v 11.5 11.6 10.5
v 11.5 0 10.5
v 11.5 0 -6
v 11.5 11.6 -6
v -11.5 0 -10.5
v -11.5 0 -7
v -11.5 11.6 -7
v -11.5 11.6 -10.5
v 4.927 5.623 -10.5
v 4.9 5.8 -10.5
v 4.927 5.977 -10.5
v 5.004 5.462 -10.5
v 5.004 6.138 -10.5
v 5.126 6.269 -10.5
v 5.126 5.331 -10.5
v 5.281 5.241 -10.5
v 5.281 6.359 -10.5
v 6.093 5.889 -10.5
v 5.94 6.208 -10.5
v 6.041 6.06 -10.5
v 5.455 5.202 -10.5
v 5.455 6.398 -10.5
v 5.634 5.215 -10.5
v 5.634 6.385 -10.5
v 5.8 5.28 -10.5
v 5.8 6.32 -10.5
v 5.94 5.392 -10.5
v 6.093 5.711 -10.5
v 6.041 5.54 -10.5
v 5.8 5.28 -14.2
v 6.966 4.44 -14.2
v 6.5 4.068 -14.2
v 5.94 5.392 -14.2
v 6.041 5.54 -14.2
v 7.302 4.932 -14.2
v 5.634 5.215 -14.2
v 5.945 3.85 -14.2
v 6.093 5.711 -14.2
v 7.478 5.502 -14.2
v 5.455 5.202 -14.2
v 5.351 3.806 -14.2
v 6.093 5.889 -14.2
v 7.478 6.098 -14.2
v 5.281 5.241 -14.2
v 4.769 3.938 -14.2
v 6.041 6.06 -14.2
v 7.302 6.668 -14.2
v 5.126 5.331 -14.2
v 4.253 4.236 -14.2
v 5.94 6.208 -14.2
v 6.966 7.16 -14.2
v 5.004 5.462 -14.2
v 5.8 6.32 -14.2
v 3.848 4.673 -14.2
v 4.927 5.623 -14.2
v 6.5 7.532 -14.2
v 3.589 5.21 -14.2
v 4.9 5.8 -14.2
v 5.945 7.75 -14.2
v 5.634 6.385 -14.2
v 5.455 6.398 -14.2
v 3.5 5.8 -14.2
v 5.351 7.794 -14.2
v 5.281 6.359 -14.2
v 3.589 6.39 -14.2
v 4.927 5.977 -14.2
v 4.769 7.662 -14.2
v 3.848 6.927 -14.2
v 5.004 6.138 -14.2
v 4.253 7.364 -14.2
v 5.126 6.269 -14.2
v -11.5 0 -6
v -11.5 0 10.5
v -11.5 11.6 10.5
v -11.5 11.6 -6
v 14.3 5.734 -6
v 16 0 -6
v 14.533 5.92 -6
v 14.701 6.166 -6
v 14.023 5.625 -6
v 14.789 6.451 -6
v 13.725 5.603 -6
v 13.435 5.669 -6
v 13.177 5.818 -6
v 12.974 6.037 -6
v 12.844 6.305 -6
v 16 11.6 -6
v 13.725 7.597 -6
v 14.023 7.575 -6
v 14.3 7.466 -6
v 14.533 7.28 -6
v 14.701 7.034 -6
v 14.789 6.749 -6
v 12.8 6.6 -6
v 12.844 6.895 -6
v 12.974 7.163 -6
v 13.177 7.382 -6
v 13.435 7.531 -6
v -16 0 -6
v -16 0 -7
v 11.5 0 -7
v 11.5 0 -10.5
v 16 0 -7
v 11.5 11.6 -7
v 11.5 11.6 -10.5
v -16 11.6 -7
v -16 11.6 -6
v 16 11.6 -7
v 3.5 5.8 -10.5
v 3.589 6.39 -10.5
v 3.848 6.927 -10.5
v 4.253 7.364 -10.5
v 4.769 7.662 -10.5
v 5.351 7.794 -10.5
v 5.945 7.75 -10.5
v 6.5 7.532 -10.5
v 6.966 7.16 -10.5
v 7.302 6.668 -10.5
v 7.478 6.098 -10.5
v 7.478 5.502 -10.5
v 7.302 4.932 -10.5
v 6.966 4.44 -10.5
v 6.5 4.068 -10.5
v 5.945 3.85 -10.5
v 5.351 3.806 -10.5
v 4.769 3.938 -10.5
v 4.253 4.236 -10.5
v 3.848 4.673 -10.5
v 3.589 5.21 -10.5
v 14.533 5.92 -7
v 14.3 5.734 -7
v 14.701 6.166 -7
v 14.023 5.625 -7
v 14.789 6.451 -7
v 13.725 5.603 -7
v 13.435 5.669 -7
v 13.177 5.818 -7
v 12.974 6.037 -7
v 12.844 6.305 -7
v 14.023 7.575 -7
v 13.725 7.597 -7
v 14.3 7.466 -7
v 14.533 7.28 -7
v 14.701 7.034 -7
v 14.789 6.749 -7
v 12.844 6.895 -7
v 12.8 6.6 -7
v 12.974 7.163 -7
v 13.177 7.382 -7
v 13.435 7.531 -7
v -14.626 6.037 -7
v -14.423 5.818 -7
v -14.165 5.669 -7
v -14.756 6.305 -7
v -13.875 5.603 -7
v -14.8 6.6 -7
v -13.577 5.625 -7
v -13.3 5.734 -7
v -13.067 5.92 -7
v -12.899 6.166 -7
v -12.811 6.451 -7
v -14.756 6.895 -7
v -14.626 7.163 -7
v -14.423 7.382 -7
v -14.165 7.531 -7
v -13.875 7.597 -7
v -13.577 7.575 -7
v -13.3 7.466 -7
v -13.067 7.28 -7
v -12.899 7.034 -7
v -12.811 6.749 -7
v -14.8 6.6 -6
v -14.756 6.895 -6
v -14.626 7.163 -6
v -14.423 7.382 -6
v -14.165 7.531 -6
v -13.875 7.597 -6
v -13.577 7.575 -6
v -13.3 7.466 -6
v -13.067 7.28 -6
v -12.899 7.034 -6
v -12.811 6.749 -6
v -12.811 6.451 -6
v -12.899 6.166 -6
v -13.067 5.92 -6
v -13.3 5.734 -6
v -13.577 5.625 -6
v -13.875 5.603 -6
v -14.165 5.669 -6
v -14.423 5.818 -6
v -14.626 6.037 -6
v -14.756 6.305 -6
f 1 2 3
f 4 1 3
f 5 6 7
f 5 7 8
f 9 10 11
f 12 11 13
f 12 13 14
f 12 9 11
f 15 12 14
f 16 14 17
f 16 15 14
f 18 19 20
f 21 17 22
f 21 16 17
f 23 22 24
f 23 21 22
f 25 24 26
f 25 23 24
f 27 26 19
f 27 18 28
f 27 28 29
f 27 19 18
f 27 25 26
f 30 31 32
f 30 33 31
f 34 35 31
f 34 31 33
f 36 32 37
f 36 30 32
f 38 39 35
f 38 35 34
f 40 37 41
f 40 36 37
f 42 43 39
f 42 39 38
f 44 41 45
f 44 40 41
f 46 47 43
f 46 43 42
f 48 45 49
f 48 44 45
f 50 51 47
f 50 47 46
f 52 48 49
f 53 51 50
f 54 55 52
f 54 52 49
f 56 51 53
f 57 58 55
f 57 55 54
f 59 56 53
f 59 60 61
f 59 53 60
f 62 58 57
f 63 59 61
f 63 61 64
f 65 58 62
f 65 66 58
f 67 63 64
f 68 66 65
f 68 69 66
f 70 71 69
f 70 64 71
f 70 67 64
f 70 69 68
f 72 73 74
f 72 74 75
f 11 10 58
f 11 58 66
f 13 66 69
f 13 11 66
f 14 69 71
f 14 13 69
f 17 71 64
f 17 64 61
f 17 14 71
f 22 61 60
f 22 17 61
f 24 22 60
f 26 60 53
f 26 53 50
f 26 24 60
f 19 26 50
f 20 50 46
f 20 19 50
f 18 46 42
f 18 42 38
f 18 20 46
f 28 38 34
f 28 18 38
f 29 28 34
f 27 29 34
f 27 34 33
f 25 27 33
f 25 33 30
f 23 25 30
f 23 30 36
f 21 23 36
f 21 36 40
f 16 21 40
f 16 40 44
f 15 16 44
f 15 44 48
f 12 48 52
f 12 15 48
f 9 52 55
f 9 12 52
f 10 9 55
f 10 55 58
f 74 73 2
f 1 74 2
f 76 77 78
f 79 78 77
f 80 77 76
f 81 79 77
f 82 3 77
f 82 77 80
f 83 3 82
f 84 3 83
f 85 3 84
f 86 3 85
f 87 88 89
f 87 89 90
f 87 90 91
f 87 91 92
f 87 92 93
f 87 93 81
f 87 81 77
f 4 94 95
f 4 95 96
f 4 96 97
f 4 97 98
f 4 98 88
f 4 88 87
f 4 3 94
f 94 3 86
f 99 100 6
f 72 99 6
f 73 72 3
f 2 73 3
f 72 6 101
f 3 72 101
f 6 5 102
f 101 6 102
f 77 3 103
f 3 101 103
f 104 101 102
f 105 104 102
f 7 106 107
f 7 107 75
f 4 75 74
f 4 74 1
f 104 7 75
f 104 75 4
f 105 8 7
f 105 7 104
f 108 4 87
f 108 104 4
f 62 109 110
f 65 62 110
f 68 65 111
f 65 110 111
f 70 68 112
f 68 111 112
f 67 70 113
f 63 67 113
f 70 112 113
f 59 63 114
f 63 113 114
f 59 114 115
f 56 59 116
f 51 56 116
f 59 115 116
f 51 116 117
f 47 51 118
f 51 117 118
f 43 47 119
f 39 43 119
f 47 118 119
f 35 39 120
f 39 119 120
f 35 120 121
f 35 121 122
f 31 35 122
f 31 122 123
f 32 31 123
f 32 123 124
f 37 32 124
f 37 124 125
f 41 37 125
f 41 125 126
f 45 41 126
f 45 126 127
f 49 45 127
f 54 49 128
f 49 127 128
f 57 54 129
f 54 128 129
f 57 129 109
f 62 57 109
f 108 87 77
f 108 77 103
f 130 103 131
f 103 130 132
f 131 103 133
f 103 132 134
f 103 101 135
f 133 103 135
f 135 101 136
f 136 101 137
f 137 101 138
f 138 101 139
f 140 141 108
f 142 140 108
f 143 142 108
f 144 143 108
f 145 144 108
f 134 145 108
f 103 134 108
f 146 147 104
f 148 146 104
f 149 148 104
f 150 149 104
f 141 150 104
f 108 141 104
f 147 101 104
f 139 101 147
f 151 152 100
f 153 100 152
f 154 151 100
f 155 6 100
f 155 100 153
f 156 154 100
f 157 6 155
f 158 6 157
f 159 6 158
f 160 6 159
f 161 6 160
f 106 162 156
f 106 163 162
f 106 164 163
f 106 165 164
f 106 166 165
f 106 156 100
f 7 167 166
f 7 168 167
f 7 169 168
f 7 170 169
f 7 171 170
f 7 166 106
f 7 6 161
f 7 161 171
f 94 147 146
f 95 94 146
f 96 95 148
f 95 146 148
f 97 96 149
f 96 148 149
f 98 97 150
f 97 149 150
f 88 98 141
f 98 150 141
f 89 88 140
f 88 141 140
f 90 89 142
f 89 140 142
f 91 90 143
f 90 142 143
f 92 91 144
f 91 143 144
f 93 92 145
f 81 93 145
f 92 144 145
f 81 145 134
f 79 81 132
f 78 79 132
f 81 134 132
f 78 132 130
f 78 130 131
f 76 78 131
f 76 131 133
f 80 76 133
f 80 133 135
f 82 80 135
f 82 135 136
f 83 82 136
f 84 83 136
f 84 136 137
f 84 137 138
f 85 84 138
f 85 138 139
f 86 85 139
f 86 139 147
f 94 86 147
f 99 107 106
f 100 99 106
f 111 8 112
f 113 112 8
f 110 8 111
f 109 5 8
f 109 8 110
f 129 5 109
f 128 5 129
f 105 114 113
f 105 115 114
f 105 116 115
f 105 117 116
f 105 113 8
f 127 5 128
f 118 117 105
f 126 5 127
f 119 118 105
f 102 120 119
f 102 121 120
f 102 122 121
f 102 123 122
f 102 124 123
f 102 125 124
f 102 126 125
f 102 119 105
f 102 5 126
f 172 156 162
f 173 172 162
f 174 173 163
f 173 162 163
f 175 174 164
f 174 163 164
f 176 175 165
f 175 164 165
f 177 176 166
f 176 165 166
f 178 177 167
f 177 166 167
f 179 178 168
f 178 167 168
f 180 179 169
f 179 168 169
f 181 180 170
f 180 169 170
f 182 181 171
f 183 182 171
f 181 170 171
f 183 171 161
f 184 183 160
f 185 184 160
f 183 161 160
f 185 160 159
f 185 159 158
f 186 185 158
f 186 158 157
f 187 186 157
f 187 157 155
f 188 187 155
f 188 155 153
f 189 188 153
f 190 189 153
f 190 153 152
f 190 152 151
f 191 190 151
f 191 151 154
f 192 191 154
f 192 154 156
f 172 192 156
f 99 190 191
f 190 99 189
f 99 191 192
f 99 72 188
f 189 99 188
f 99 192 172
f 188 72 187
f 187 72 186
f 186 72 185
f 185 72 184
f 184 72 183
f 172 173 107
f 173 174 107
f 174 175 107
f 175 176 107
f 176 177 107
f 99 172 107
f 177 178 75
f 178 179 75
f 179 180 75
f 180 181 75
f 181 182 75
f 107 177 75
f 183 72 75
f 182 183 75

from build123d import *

# Parameters (mm, degrees)
SKETCH1_W           = 23
SKETCH1_H           = 21
BOSS_EXTRUDE1_DEPTH = 11.6
SKETCH2_W           = 1
SKETCH2_H           = 11.6
BOSS_EXTRUDE2_DEPTH = 4.5
SKETCH3_R           = 2
SKETCH3_R_2         = 0.6
BOSS_EXTRUDE3_DEPTH = 3.7
SKETCH4_R           = 1
CUT_EXTRUDE1_DEPTH  = 5


with BuildPart() as part:
    # Sketch1 → Boss-Extrude1 (new body)
    with BuildSketch(Plane(origin=(0, 0, 0), x_dir=(1, 0, 0), z_dir=(0, 1, 0))):
        Rectangle(SKETCH1_W, SKETCH1_H)
    extrude(amount=BOSS_EXTRUDE1_DEPTH)

    # Sketch2 → Boss-Extrude2 (add)
    with BuildSketch(Plane(origin=(11.5, 0, 0), x_dir=(0, 0, -1), z_dir=(1, 0, 0))):
        with Locations((6.5, 5.8)):
            Rectangle(SKETCH2_W, SKETCH2_H)
    boss_extrude2 = extrude(amount=BOSS_EXTRUDE2_DEPTH)

    # Mirror1: Boss-Extrude2 across plane
    add(boss_extrude2.mirror(Plane(origin=(0, 0, 0), x_dir=(0, 0, 1), z_dir=(1, 0, 0))))

    # Sketch3 → Boss-Extrude3 (add)
    with BuildSketch(Plane(origin=(0, 0, -10.5), x_dir=(-1, 0, 0), z_dir=(0, 0, -1))):
        with Locations((-5.5, 5.8)):
            Circle(SKETCH3_R)
        with Locations((-5.5, 5.8)):
            Circle(SKETCH3_R_2, mode=Mode.SUBTRACT)
    extrude(amount=BOSS_EXTRUDE3_DEPTH)

    # Sketch4 → Cut-Extrude1 (cut)
    with BuildSketch(Plane(origin=(0, 0, -7), x_dir=(-1, 0, 0), z_dir=(0, 0, -1))):
        with Locations((-13.8, 6.6)):
            Circle(SKETCH4_R)
        with Locations((13.8, 6.6)):
            Circle(SKETCH4_R)
    extrude(amount=-CUT_EXTRUDE1_DEPTH, mode=Mode.SUBTRACT)


solid = part.part
